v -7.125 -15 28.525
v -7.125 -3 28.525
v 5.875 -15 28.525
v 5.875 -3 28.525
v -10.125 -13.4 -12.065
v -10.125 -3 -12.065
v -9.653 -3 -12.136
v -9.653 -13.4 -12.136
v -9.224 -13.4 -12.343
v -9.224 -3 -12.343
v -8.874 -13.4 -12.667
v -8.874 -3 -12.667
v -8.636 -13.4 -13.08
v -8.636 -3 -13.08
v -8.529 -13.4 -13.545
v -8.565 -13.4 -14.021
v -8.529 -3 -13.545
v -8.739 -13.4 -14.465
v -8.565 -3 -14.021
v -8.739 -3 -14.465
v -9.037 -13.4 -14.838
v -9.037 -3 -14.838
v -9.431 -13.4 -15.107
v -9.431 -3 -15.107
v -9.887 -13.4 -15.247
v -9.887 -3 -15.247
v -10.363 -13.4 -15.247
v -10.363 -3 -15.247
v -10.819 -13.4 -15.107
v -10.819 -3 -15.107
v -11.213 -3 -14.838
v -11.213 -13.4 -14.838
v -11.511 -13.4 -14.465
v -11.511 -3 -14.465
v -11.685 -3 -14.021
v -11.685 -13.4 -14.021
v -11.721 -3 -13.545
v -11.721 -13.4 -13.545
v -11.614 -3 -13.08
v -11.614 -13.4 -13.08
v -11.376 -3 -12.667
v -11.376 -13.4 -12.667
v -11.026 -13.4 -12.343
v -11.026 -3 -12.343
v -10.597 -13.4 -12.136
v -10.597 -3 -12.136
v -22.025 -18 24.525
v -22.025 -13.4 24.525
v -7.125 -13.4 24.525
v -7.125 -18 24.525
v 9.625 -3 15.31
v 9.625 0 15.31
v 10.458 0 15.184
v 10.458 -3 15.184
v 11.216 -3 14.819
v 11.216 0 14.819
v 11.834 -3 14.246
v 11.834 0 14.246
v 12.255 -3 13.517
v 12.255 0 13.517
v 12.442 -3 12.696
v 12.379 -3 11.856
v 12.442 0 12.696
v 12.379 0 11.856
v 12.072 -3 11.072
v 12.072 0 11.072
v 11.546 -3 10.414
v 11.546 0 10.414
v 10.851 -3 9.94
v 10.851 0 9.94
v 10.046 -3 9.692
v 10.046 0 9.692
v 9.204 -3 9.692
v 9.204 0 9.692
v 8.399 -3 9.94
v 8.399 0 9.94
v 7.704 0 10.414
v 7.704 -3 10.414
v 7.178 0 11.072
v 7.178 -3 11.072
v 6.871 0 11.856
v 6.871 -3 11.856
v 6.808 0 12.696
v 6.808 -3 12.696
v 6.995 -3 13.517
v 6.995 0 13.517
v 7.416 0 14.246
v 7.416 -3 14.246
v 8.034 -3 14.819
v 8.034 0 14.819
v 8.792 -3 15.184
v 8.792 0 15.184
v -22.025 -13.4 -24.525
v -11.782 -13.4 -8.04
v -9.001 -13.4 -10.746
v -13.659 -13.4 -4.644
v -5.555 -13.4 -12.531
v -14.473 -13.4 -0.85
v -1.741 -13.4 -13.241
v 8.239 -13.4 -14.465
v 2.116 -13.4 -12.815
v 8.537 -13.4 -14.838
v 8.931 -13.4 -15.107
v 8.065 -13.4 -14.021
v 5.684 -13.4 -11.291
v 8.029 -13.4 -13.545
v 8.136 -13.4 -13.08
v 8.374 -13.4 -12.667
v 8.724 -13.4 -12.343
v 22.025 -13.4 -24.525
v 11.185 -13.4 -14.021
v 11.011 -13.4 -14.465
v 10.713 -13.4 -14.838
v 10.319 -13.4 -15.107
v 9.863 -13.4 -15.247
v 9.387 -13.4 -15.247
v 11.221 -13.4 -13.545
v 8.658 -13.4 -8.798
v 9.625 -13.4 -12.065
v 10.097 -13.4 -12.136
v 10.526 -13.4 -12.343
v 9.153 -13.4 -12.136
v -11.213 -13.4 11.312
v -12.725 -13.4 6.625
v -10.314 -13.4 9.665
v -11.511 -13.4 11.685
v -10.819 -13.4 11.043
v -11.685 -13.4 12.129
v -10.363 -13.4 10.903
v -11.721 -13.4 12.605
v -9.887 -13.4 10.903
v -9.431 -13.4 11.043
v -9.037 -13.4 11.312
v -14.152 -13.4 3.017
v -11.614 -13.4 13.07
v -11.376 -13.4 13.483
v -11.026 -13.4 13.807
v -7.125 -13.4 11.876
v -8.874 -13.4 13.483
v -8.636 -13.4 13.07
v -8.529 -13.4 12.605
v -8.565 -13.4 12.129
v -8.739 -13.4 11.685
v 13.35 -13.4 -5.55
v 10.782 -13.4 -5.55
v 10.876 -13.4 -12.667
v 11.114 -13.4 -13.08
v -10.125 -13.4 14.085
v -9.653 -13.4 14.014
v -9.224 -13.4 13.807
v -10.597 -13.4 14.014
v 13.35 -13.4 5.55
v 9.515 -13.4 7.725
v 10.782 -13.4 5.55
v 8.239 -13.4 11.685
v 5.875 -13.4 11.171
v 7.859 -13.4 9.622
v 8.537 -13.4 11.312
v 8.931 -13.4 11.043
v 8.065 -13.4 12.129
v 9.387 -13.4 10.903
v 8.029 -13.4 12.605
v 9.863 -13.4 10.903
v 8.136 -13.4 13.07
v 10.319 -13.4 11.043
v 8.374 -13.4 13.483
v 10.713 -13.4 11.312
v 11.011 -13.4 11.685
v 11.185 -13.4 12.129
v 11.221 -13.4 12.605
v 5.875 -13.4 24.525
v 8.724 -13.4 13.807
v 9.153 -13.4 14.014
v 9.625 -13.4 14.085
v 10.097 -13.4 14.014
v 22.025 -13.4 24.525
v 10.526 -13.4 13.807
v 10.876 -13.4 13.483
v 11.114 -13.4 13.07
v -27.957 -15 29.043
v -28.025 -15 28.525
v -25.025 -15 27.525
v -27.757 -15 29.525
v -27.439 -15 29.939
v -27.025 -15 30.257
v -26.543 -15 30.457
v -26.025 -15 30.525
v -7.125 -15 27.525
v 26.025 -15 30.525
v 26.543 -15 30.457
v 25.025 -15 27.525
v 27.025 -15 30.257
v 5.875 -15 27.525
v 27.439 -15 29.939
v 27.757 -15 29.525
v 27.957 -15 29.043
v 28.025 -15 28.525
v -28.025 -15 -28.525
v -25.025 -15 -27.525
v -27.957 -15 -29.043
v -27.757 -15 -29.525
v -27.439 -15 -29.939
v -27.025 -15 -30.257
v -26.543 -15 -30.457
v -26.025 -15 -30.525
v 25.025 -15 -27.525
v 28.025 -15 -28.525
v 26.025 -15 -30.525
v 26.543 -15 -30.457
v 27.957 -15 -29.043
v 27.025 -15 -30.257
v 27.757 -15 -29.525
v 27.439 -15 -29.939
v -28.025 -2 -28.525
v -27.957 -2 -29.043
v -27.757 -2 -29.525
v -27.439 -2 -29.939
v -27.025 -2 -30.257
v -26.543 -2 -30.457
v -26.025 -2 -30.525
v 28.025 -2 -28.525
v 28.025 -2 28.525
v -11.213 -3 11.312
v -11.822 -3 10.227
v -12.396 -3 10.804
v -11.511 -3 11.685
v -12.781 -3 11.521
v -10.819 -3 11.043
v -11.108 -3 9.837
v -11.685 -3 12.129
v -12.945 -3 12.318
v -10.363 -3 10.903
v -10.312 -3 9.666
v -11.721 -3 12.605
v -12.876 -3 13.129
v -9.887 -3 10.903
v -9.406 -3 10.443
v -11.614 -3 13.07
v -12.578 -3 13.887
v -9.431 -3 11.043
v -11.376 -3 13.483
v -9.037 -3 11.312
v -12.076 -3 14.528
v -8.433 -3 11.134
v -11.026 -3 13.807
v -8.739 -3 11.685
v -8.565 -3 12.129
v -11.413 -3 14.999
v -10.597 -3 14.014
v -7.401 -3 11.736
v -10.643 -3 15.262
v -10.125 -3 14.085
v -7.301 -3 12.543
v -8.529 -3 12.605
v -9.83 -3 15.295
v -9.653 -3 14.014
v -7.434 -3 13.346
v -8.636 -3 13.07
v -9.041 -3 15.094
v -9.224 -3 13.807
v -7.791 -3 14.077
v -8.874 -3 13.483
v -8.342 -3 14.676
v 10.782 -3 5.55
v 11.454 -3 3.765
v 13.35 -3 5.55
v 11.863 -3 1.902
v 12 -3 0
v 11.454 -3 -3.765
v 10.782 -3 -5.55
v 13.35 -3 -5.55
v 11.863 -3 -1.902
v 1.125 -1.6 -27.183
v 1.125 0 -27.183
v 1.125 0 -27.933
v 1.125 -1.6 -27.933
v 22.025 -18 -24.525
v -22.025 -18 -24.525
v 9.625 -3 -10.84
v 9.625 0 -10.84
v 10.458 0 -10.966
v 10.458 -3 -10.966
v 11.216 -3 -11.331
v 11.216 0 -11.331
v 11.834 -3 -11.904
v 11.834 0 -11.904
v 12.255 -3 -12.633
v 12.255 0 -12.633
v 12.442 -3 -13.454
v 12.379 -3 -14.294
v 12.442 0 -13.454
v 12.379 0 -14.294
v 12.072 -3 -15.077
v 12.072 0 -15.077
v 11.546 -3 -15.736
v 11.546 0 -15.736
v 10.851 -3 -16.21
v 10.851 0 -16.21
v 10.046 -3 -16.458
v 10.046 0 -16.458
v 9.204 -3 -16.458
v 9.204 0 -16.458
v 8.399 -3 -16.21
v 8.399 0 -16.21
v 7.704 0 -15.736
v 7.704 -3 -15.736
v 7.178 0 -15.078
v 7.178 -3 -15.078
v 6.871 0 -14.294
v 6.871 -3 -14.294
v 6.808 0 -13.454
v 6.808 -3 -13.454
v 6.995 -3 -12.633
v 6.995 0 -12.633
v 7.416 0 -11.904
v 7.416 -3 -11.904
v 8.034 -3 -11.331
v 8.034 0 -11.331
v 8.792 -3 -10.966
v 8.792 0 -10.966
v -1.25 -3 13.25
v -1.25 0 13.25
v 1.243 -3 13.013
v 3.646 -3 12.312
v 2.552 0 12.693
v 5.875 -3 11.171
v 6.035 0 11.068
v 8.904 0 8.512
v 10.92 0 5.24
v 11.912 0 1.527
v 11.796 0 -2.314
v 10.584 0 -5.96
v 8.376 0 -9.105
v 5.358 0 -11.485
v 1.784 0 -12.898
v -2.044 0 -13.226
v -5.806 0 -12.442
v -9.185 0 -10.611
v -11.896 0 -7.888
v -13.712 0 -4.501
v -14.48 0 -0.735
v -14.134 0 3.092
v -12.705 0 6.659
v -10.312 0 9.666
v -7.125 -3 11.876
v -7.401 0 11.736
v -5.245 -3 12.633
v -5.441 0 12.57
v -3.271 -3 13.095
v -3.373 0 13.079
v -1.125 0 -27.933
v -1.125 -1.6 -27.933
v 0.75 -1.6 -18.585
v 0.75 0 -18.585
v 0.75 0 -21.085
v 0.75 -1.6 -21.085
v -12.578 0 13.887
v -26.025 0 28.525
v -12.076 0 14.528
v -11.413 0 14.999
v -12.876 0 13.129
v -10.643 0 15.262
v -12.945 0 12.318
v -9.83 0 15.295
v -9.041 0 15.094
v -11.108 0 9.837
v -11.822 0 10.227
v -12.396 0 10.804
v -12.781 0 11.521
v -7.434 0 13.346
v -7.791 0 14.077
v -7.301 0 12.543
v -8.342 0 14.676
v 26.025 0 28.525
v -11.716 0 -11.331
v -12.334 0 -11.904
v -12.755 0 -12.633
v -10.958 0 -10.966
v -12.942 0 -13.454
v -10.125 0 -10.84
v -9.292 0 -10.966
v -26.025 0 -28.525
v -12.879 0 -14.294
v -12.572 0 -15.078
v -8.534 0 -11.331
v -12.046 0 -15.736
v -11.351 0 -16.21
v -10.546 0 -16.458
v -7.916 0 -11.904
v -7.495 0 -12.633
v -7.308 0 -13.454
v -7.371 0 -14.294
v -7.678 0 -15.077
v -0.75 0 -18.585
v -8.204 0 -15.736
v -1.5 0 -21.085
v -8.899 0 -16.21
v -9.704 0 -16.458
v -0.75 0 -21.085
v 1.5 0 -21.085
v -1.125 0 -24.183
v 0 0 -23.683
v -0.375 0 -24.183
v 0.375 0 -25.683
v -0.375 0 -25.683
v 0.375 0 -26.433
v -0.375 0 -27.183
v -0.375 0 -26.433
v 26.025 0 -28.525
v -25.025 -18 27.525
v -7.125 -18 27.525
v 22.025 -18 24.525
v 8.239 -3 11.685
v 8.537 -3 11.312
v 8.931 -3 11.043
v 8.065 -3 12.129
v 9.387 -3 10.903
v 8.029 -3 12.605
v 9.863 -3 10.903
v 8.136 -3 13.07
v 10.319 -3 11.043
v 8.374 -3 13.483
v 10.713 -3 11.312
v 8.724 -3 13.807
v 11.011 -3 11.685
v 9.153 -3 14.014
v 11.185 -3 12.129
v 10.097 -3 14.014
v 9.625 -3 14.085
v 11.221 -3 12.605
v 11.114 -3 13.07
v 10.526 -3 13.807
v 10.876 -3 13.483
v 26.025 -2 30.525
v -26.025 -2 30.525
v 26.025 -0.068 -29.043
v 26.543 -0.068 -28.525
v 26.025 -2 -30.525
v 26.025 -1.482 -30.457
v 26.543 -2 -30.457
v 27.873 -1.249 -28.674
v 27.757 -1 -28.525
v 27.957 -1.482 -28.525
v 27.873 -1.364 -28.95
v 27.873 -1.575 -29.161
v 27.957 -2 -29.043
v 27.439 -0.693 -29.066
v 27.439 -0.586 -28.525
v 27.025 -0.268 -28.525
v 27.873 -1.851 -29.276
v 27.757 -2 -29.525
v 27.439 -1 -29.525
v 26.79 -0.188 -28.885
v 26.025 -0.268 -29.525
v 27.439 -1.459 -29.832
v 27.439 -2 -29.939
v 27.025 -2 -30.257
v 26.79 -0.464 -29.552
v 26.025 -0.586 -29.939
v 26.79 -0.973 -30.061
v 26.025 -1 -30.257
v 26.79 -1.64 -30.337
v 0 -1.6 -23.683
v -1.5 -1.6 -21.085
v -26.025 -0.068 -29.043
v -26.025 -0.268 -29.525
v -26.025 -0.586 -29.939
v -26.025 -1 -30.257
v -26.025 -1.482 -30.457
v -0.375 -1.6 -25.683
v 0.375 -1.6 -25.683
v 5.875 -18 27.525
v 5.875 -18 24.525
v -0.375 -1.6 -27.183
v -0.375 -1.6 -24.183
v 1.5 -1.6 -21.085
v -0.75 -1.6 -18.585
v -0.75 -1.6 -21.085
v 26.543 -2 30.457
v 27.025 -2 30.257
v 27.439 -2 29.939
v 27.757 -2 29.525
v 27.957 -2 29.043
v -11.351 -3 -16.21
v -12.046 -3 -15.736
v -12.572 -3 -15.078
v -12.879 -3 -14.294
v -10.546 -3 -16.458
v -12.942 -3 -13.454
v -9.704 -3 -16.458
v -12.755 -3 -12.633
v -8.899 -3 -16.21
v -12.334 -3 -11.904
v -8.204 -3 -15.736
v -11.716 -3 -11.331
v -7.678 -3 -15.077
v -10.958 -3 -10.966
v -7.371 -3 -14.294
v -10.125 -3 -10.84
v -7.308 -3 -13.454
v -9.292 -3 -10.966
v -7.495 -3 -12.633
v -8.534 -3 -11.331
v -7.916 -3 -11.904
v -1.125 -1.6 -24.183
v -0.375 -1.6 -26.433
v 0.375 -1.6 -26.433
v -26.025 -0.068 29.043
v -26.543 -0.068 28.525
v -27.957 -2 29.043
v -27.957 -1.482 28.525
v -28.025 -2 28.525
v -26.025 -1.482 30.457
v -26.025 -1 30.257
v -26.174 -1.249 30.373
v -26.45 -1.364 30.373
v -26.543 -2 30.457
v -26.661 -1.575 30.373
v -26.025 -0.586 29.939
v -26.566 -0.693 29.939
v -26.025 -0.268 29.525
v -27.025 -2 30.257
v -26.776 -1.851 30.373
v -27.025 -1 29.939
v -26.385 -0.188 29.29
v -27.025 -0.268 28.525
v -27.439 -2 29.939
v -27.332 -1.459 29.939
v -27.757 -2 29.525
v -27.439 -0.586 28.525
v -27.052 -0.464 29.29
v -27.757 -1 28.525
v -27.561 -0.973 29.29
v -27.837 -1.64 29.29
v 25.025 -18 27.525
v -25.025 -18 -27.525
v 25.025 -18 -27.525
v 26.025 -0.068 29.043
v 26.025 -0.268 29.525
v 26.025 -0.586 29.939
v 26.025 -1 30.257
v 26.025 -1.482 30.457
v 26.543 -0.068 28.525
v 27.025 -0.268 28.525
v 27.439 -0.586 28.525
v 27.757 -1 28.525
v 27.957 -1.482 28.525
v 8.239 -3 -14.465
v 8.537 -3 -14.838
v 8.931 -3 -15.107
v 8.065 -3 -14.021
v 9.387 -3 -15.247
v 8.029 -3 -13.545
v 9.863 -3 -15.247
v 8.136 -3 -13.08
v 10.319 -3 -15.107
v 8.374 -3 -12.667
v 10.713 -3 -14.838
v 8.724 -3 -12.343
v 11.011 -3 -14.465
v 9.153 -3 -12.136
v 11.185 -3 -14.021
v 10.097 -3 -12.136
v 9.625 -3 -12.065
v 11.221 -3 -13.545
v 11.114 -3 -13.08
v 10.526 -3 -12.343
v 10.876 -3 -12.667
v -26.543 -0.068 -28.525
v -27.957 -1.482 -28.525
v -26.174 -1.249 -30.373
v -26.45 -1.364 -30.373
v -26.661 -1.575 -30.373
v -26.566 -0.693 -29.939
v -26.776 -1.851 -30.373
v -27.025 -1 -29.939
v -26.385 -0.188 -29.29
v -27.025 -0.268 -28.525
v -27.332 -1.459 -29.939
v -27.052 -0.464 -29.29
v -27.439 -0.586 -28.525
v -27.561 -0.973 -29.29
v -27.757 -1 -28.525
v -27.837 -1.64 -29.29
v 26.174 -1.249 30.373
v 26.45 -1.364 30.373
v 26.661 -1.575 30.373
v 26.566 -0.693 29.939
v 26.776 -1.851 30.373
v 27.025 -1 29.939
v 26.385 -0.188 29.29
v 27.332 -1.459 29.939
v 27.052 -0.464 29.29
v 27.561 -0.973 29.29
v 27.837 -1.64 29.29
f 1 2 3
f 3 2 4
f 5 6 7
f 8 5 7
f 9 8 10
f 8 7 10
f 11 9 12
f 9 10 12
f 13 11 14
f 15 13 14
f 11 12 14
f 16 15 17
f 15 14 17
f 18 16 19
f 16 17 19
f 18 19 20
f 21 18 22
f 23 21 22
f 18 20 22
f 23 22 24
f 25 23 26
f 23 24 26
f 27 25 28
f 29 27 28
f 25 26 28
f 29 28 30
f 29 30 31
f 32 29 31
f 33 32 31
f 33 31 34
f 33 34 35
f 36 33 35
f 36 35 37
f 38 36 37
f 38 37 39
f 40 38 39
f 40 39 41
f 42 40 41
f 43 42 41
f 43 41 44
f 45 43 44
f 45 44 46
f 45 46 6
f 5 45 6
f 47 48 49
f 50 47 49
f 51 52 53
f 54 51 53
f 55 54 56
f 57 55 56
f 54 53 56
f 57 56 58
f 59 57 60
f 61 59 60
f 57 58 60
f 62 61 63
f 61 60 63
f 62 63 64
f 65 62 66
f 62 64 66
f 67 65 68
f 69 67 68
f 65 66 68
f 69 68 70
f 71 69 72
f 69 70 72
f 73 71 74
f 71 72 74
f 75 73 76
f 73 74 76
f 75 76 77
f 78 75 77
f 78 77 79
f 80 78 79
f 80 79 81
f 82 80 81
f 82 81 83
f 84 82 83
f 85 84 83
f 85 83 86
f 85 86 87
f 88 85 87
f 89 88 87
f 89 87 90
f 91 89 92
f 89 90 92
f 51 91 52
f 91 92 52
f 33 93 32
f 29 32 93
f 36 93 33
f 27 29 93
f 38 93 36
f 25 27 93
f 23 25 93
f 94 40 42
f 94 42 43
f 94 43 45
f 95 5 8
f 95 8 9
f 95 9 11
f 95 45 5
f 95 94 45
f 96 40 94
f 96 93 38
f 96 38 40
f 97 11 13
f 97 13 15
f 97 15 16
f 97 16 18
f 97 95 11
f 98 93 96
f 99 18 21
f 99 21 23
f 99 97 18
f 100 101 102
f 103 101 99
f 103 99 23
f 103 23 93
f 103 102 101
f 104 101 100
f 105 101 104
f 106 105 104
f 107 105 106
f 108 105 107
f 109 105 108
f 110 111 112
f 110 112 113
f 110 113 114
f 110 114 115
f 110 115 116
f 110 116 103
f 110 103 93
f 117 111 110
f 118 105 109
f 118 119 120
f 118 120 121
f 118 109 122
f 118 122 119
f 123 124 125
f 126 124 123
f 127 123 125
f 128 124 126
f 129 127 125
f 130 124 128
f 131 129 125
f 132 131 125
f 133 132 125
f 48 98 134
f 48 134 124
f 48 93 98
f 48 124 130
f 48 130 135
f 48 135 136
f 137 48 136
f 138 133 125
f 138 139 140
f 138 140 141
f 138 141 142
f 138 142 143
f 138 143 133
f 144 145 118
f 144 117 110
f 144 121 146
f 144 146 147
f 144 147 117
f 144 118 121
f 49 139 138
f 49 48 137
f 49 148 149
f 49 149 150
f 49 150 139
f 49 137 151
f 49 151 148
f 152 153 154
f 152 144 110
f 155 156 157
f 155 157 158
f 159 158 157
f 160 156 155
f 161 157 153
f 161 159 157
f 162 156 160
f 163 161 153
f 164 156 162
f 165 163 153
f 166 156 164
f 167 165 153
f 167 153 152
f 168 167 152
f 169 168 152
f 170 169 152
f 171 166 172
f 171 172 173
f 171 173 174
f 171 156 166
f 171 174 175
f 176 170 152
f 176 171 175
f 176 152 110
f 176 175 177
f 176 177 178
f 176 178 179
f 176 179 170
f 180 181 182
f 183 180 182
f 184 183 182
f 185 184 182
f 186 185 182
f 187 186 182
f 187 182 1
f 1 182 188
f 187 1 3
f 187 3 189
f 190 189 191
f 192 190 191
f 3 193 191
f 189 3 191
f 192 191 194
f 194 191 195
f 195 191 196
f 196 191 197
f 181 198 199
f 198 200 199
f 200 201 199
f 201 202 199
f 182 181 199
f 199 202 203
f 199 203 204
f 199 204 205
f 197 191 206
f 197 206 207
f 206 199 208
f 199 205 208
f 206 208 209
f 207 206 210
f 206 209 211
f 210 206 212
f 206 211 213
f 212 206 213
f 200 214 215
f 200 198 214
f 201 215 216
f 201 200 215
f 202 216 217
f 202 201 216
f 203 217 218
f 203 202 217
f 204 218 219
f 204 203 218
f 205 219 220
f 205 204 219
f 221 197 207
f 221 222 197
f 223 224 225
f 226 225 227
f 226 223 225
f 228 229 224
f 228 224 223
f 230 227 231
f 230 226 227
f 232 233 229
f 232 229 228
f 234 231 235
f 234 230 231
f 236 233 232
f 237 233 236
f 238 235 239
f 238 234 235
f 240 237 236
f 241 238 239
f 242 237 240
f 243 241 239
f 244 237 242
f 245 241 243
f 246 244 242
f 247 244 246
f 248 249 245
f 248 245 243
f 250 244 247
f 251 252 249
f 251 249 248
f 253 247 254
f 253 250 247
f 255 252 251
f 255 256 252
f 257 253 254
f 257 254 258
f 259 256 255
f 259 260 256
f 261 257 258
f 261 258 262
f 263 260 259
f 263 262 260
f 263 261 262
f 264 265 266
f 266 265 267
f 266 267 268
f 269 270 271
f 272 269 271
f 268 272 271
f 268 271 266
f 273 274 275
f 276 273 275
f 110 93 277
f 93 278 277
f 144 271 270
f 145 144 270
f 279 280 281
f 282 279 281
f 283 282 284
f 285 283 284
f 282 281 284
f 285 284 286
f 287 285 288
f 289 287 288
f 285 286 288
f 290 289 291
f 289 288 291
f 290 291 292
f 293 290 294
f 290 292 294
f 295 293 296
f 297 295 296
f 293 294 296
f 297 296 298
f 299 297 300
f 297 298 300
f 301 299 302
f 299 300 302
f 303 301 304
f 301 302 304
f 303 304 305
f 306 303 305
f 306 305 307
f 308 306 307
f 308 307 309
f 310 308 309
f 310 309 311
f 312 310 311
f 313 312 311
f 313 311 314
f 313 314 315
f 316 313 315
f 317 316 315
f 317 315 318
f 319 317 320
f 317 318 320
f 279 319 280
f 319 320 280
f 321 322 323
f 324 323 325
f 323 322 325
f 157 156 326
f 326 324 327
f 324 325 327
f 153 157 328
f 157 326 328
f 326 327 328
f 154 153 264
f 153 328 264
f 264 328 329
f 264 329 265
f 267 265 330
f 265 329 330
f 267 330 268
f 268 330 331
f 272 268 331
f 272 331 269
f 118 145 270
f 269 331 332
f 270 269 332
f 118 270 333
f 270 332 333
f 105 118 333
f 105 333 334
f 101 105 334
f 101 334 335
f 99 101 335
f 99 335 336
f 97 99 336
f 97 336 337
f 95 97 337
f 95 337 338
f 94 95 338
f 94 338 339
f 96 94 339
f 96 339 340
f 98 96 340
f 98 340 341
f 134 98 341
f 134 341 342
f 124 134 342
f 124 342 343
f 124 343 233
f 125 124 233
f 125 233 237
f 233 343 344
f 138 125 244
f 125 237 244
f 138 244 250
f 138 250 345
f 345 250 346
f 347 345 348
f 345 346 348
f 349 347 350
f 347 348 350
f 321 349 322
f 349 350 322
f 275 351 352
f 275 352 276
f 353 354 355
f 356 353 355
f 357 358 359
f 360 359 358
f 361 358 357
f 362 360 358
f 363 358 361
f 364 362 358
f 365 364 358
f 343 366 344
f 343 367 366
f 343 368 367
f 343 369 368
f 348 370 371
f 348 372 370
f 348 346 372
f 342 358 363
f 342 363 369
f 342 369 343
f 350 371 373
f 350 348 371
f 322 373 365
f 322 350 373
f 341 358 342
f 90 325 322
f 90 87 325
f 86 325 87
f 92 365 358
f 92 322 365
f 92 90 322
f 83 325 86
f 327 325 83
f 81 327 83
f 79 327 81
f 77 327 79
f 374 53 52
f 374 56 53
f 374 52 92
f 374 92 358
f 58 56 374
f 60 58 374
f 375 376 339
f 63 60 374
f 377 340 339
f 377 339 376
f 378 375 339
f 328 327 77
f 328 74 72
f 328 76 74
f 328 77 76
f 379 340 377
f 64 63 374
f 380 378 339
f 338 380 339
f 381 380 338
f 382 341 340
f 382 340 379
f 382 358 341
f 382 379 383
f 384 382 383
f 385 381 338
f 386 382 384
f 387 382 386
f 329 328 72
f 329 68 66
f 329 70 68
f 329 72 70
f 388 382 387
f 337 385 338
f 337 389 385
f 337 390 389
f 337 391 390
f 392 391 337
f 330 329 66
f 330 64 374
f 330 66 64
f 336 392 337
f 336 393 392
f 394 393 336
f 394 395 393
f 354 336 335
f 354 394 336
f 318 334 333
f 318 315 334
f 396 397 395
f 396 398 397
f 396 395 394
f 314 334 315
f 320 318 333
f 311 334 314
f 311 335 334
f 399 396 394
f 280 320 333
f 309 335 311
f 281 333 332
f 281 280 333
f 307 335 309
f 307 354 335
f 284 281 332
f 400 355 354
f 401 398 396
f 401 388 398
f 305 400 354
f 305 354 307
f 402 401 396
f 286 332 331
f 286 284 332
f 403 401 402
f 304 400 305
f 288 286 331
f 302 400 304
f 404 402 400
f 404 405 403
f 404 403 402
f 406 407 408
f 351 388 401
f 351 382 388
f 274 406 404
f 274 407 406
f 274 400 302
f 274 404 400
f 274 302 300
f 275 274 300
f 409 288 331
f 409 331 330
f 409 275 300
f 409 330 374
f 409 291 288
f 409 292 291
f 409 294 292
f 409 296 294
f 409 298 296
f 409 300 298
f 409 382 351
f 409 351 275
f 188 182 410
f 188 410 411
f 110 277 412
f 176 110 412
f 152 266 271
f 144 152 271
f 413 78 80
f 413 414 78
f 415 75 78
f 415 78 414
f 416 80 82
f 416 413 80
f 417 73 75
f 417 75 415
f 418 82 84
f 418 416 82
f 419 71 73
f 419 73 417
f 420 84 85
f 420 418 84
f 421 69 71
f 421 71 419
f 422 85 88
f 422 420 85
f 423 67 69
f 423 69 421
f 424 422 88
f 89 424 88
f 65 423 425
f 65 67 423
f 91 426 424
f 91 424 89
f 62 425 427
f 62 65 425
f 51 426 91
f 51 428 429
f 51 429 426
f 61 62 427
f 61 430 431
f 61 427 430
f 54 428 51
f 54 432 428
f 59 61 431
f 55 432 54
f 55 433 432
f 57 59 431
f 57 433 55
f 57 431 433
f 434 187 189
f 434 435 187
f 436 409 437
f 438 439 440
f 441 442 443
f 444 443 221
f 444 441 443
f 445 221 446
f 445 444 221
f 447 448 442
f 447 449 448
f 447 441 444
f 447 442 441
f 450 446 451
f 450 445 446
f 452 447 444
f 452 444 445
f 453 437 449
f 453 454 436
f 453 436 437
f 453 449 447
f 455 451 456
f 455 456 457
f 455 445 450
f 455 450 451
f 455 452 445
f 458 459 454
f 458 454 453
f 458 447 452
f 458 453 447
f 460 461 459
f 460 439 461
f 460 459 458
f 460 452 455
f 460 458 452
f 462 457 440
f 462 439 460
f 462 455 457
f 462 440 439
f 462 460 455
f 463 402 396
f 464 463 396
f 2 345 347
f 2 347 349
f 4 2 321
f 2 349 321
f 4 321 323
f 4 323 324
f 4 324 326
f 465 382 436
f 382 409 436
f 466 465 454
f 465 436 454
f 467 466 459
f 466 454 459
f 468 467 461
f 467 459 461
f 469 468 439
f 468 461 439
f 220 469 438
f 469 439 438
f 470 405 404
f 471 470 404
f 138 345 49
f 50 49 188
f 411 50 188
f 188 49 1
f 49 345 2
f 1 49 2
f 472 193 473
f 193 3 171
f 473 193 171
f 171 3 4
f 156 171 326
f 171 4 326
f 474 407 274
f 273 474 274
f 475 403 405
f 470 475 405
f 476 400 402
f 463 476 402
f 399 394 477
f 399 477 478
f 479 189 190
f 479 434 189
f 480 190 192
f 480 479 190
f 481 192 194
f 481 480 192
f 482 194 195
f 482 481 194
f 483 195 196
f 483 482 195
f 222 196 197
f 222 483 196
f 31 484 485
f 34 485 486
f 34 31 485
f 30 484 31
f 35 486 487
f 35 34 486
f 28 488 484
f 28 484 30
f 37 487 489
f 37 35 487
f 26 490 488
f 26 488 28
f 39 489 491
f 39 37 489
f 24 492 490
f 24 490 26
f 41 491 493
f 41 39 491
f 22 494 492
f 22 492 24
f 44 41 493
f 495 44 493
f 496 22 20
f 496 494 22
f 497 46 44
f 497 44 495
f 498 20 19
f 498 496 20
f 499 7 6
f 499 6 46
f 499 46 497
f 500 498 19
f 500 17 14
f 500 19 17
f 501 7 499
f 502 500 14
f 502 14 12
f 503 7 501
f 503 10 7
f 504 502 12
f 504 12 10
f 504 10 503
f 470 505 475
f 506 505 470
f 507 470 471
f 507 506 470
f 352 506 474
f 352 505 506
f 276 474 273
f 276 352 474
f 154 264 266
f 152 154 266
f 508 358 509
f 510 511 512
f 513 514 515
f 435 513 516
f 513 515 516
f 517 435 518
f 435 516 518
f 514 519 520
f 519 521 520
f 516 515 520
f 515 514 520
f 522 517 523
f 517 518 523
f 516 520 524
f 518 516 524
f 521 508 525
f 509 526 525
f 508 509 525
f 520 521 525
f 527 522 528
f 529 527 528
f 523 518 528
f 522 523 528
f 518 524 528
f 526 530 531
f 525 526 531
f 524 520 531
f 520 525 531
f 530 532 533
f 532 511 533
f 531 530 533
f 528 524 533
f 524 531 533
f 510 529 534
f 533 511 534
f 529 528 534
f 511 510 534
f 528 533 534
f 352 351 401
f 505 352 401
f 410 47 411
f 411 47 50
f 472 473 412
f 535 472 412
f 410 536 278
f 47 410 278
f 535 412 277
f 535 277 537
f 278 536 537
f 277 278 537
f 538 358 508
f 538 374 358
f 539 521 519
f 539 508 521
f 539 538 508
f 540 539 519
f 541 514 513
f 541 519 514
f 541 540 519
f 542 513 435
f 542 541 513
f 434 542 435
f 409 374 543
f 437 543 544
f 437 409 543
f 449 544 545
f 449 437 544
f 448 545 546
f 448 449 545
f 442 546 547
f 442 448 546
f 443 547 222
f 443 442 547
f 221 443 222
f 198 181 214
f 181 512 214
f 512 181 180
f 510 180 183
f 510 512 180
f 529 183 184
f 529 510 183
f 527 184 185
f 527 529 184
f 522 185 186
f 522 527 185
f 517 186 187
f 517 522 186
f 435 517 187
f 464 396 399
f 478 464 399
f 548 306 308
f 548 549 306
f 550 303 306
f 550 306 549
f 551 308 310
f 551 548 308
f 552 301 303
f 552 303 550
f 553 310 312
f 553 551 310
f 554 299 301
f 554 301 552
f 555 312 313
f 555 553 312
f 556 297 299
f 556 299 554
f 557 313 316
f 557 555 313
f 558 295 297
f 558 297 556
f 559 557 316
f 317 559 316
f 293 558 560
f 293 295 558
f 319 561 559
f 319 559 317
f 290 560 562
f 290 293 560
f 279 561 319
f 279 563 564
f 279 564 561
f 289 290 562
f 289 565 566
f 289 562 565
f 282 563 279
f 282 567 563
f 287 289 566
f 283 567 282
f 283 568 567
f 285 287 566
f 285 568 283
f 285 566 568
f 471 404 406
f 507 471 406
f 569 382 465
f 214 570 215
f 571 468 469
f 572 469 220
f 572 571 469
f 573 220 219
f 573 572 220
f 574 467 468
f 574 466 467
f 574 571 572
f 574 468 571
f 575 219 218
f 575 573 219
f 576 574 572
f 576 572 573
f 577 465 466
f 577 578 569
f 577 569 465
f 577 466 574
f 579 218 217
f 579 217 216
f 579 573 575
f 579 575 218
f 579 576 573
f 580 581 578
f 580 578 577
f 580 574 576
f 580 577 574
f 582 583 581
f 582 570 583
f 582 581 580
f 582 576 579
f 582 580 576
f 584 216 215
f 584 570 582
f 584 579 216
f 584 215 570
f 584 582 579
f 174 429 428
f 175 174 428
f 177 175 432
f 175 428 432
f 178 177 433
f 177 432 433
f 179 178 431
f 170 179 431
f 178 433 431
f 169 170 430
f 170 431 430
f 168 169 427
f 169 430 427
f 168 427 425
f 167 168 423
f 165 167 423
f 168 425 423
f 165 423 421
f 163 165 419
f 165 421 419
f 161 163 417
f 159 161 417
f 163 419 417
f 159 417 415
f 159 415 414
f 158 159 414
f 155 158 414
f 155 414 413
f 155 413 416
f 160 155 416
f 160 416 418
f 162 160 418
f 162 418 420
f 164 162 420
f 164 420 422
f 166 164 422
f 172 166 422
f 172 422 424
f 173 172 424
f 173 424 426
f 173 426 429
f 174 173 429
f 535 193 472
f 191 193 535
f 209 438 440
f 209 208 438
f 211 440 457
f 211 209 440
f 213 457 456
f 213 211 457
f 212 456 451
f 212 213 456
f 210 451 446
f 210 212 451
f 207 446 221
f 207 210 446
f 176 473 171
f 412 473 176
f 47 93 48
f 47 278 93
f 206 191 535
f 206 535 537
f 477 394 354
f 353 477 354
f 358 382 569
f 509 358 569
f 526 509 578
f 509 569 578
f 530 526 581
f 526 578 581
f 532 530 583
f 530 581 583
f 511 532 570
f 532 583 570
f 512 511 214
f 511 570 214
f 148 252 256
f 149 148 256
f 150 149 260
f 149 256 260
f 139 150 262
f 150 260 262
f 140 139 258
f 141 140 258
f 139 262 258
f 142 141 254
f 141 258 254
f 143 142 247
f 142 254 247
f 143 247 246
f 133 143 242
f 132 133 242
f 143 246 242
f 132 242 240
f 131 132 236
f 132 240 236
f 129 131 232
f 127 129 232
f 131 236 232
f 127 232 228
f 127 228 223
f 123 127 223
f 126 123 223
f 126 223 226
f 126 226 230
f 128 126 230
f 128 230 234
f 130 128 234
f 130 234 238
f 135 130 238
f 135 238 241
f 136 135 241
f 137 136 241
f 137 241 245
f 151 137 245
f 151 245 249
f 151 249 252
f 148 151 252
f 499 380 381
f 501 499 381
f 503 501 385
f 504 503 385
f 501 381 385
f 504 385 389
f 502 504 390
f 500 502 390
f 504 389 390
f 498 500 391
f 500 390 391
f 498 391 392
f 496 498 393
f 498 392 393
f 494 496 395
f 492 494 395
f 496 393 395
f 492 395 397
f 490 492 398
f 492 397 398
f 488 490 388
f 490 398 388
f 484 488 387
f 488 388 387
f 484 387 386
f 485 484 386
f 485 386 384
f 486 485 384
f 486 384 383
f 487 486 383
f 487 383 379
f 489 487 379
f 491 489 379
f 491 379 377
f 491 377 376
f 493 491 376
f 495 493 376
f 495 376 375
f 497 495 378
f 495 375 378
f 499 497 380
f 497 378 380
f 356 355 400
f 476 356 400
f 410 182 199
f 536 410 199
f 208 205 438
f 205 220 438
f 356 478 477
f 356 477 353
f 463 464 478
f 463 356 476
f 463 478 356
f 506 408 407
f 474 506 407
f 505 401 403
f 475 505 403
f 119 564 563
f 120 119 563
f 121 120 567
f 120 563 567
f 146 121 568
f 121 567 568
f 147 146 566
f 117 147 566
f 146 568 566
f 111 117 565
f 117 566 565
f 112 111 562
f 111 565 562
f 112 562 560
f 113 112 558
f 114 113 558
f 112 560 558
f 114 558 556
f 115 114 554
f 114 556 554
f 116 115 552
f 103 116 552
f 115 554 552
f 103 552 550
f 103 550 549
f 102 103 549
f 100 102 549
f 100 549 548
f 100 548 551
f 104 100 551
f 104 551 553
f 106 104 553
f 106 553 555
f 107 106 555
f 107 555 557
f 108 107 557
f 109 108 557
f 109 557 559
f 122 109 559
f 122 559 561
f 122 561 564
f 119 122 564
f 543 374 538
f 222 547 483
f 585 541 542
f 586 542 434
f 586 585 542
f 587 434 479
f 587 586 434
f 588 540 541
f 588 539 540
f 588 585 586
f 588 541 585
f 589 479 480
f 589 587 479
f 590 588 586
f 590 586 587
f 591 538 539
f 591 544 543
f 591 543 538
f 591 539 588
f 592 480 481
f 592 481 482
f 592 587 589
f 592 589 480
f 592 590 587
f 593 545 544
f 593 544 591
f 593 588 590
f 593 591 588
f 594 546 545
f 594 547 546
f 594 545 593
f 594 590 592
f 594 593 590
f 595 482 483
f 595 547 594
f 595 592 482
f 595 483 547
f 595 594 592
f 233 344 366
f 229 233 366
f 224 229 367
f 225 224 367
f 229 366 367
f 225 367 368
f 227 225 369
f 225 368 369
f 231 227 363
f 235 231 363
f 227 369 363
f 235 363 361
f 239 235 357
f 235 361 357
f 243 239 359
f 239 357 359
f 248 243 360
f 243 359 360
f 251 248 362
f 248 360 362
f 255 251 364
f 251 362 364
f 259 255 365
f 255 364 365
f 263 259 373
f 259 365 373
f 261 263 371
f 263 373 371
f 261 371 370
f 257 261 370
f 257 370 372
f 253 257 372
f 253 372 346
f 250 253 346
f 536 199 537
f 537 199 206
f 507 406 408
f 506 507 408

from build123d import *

# Parameters (mm, degrees)
SKETCH1_W           = 56.05
SKETCH1_H           = 61.05
SKETCH1_W_2         = 50.05
SKETCH1_H_2         = 55.05
SKETCH1_W_3         = 44.05
SKETCH1_H_3         = 49.05
BOSS_EXTRUDE1_DEPTH = 3
SKETCH1_3_W         = 56.05
SKETCH1_3_H         = 61.05
SKETCH1_3_W_2       = 50.05
SKETCH1_3_H_2       = 55.05
SKETCH1_3_W_3       = 44.05
SKETCH1_3_H_3       = 49.05
BOSS_EXTRUDE2_DEPTH = 15
SKETCH1_4_W         = 50.05
SKETCH1_4_H         = 55.05
SKETCH1_4_W_2       = 44.05
SKETCH1_4_H_2       = 49.05
BOSS_EXTRUDE3_DEPTH = 18
FILLET1_R           = 2
SKETCH2_R           = 13.25
CUT_EXTRUDE1_DEPTH  = 19
SKETCH2_9_R         = 2.825
SKETCH2_9_R_2       = 1.6
SKETCH2_9_R_3       = 13.25
CUT_EXTRUDE2_DEPTH  = 3
CUT_EXTRUDE3_START  = -3
SKETCH2_10_R        = 1.6
SKETCH2_10_W        = 13
SKETCH2_10_H        = 10.44
SKETCH2_10_H_2      = 1
SKETCH2_10_W_2      = 0.1
SKETCH2_10_H_3      = 11.1
CUT_EXTRUDE3_DEPTH  = 16
SKETCH5_W           = 44.05
SKETCH5_H           = 49.05
CUT_EXTRUDE4_DEPTH  = 1.6
SKETCH2_11_W        = 2.25
SKETCH2_11_H        = 0.408076211
SKETCH2_11_W_2      = 1.5
SKETCH2_11_H_2      = 2.5
CUT_EXTRUDE5_DEPTH  = 1.6


with BuildPart() as part:
    # Sketch1 → Boss-Extrude1 (new body)
    with BuildSketch(Plane(origin=(0, 0, 0), x_dir=(1, 0, 0), z_dir=(0, 1, 0))):
        Rectangle(SKETCH1_W, SKETCH1_H)
        Rectangle(SKETCH1_W_2, SKETCH1_H_2, mode=Mode.SUBTRACT)
        Rectangle(SKETCH1_W_2, SKETCH1_H_2)
        Rectangle(SKETCH1_W_3, SKETCH1_H_3, mode=Mode.SUBTRACT)
        Rectangle(SKETCH1_W_3, SKETCH1_H_3)
    extrude(amount=-BOSS_EXTRUDE1_DEPTH)

    # Sketch1_3 → Boss-Extrude2 (add)
    with BuildSketch(Plane(origin=(0, 0, 0), x_dir=(1, 0, 0), z_dir=(0, 1, 0))):
        Rectangle(SKETCH1_3_W, SKETCH1_3_H)
        Rectangle(SKETCH1_3_W_2, SKETCH1_3_H_2, mode=Mode.SUBTRACT)
        Rectangle(SKETCH1_3_W_2, SKETCH1_3_H_2)
        Rectangle(SKETCH1_3_W_3, SKETCH1_3_H_3, mode=Mode.SUBTRACT)
        Rectangle(SKETCH1_3_W_3, SKETCH1_3_H_3)
    extrude(amount=-BOSS_EXTRUDE2_DEPTH)

    # Sketch1_4 → Boss-Extrude3 (add)
    with BuildSketch(Plane(origin=(0, 0, 0), x_dir=(1, 0, 0), z_dir=(0, 1, 0))):
        Rectangle(SKETCH1_4_W, SKETCH1_4_H)
        Rectangle(SKETCH1_4_W_2, SKETCH1_4_H_2, mode=Mode.SUBTRACT)
    extrude(amount=-BOSS_EXTRUDE3_DEPTH)

    # Fillet1
    fillet1_edges = [part.edges().sort_by_distance(p)[0] for p in [
        (-28.025, 0, 0),
        (0, 0, -30.525),
        (28.025, 0, 0),
        (0, 0, 30.525),
        (-28.025, -7.5, 30.525),
        (-28.025, -7.5, -30.525),
        (28.025, -7.5, -30.525),
        (28.025, -7.5, 30.525),
    ]]
    fillet(fillet1_edges, radius=FILLET1_R)

    # Sketch2 → Cut-Extrude1 (cut, through all)
    with BuildSketch(Plane(origin=(0, 0, 0), x_dir=(1, 0, 0), z_dir=(0, 1, 0))):
        with Locations(Location((-1.25, 0, 0), (0, 0, 270))):  # turned: the seam where the file's is
            Circle(SKETCH2_R)
    extrude(amount=-CUT_EXTRUDE1_DEPTH, mode=Mode.SUBTRACT)

    # Sketch2_9 → Cut-Extrude2 (cut)
    with BuildSketch(Plane(origin=(0, 0, 0), x_dir=(1, 0, 0), z_dir=(0, 1, 0))):
        with Locations(Location((-10.125, 13.665, 0), (0, 0, 270))):  # turned: the seam where the file's is
            Circle(SKETCH2_9_R)
        with Locations((-10.125, 13.665)):
            Circle(SKETCH2_9_R_2, mode=Mode.SUBTRACT)
        with Locations(Location((9.625, 13.665, 0), (0, 0, 270))):  # turned: the seam where the file's is
            Circle(SKETCH2_9_R)
        with Locations((9.625, 13.665)):
            Circle(SKETCH2_9_R_2, mode=Mode.SUBTRACT)
        with Locations(Location((9.625, -12.485, 0), (0, 0, 270))):  # turned: the seam where the file's is
            Circle(SKETCH2_9_R)
        with Locations((9.625, -12.485)):
            Circle(SKETCH2_9_R_2, mode=Mode.SUBTRACT)
        with Locations(Location((-1.25, 0, 0), (0, 0, 270))):  # turned: the seam where the file's is
            Circle(SKETCH2_9_R_3)
        with Locations((-10.125, -12.485)):
            Circle(SKETCH2_9_R)
        with Locations((-10.125, -12.485)):
            Circle(SKETCH2_9_R_2, mode=Mode.SUBTRACT)
        with Locations(Location((-1.25, 0, 0), (0, 0, 270))):  # turned: the seam where the file's is
            Circle(SKETCH2_9_R_3)
        with Locations((-10.125, -12.485)):
            Circle(SKETCH2_9_R)
        with Locations((-10.125, 13.665)):
            Circle(SKETCH2_9_R_2)
        with Locations((9.625, 13.665)):
            Circle(SKETCH2_9_R_2)
        with Locations((9.625, -12.485)):
            Circle(SKETCH2_9_R_2)
        with Locations((-10.125, -12.485)):
            Circle(SKETCH2_9_R_2)
    extrude(amount=-CUT_EXTRUDE2_DEPTH, mode=Mode.SUBTRACT)

    # Sketch2_10 → Cut-Extrude3 (cut, through all)
    with BuildSketch(Plane(origin=(0, 0, 0), x_dir=(1, 0, 0), z_dir=(0, 1, 0)).offset(CUT_EXTRUDE3_START)):
        with Locations(Location((-10.125, 13.665, 0), (0, 0, 270))):  # turned: the seam where the file's is
            Circle(SKETCH2_10_R)
        with Locations(Location((9.625, 13.665, 0), (0, 0, 270))):  # turned: the seam where the file's is
            Circle(SKETCH2_10_R)
        with Locations(Location((9.625, -12.485, 0), (0, 0, 270))):  # turned: the seam where the file's is
            Circle(SKETCH2_10_R)
        with Locations(Location((-10.125, -12.485, 0), (0, 0, 270))):  # turned: the seam where the file's is
            Circle(SKETCH2_10_R)
        with BuildLine():
            Line((-7.125, -17.085), (5.875, -17.085))
            Line((5.875, -17.085), (5.875, -11.171252168))
            ThreePointArc((5.875, -11.171252168), (-0.532432127, -13.230555406), (-7.125, -11.876315717))
            Line((-7.125, -11.876315717), (-7.125, -17.085))
        make_face()
        with Locations((-0.625, -22.305)):
            Rectangle(SKETCH2_10_W, SKETCH2_10_H)
        with Locations((-0.625, -28.025)):
            Rectangle(SKETCH2_10_W, SKETCH2_10_H_2)
        with BuildLine():
            Line((10.781624994, -5.55), (13.25, -5.55))
            Line((13.25, -5.55), (13.25, 5.55))
            Line((13.25, 5.55), (10.781624994, 5.55))
            ThreePointArc((10.781624994, 5.55), (11.691822344, 2.841079797), (12, 0))
            ThreePointArc((12, 0), (11.691822344, -2.841079797), (10.781624994, -5.55))
        make_face()
        with Locations((13.3, 0)):
            Rectangle(SKETCH2_10_W_2, SKETCH2_10_H_3)
    extrude(amount=-CUT_EXTRUDE3_DEPTH, mode=Mode.SUBTRACT)

    # Sketch5 → Cut-Extrude4 (cut)
    with BuildSketch(Plane.XZ.offset(15)):
        Rectangle(SKETCH5_W, SKETCH5_H)
    extrude(amount=-CUT_EXTRUDE4_DEPTH, mode=Mode.SUBTRACT)

    # Sketch2_11 → Cut-Extrude5 (cut)
    with BuildSketch(Plane(origin=(0, 0, 0), x_dir=(1, 0, 0), z_dir=(0, 1, 0))):
        Polygon((-0.375, 27.183076211), (1.125, 27.183076211), (1.125, 27.525), (-1.125, 27.525), (-1.125, 24.183076211), (-0.375, 24.183076211), (-0.375, 25.683076211), (0.375, 25.683076211), (0.375, 26.433076211), (-0.375, 26.433076211), align=None)
        with Locations((0, 27.729038106)):
            Rectangle(SKETCH2_11_W, SKETCH2_11_H)
        Polygon((-1.5, 21.085), (-0.75, 21.085), (0.75, 21.085), (1.5, 21.085), (0, 23.683076211), align=None)
        with Locations((0, 19.835)):
            Rectangle(SKETCH2_11_W_2, SKETCH2_11_H_2)
    extrude(amount=-CUT_EXTRUDE5_DEPTH, mode=Mode.SUBTRACT)


solid = part.part
